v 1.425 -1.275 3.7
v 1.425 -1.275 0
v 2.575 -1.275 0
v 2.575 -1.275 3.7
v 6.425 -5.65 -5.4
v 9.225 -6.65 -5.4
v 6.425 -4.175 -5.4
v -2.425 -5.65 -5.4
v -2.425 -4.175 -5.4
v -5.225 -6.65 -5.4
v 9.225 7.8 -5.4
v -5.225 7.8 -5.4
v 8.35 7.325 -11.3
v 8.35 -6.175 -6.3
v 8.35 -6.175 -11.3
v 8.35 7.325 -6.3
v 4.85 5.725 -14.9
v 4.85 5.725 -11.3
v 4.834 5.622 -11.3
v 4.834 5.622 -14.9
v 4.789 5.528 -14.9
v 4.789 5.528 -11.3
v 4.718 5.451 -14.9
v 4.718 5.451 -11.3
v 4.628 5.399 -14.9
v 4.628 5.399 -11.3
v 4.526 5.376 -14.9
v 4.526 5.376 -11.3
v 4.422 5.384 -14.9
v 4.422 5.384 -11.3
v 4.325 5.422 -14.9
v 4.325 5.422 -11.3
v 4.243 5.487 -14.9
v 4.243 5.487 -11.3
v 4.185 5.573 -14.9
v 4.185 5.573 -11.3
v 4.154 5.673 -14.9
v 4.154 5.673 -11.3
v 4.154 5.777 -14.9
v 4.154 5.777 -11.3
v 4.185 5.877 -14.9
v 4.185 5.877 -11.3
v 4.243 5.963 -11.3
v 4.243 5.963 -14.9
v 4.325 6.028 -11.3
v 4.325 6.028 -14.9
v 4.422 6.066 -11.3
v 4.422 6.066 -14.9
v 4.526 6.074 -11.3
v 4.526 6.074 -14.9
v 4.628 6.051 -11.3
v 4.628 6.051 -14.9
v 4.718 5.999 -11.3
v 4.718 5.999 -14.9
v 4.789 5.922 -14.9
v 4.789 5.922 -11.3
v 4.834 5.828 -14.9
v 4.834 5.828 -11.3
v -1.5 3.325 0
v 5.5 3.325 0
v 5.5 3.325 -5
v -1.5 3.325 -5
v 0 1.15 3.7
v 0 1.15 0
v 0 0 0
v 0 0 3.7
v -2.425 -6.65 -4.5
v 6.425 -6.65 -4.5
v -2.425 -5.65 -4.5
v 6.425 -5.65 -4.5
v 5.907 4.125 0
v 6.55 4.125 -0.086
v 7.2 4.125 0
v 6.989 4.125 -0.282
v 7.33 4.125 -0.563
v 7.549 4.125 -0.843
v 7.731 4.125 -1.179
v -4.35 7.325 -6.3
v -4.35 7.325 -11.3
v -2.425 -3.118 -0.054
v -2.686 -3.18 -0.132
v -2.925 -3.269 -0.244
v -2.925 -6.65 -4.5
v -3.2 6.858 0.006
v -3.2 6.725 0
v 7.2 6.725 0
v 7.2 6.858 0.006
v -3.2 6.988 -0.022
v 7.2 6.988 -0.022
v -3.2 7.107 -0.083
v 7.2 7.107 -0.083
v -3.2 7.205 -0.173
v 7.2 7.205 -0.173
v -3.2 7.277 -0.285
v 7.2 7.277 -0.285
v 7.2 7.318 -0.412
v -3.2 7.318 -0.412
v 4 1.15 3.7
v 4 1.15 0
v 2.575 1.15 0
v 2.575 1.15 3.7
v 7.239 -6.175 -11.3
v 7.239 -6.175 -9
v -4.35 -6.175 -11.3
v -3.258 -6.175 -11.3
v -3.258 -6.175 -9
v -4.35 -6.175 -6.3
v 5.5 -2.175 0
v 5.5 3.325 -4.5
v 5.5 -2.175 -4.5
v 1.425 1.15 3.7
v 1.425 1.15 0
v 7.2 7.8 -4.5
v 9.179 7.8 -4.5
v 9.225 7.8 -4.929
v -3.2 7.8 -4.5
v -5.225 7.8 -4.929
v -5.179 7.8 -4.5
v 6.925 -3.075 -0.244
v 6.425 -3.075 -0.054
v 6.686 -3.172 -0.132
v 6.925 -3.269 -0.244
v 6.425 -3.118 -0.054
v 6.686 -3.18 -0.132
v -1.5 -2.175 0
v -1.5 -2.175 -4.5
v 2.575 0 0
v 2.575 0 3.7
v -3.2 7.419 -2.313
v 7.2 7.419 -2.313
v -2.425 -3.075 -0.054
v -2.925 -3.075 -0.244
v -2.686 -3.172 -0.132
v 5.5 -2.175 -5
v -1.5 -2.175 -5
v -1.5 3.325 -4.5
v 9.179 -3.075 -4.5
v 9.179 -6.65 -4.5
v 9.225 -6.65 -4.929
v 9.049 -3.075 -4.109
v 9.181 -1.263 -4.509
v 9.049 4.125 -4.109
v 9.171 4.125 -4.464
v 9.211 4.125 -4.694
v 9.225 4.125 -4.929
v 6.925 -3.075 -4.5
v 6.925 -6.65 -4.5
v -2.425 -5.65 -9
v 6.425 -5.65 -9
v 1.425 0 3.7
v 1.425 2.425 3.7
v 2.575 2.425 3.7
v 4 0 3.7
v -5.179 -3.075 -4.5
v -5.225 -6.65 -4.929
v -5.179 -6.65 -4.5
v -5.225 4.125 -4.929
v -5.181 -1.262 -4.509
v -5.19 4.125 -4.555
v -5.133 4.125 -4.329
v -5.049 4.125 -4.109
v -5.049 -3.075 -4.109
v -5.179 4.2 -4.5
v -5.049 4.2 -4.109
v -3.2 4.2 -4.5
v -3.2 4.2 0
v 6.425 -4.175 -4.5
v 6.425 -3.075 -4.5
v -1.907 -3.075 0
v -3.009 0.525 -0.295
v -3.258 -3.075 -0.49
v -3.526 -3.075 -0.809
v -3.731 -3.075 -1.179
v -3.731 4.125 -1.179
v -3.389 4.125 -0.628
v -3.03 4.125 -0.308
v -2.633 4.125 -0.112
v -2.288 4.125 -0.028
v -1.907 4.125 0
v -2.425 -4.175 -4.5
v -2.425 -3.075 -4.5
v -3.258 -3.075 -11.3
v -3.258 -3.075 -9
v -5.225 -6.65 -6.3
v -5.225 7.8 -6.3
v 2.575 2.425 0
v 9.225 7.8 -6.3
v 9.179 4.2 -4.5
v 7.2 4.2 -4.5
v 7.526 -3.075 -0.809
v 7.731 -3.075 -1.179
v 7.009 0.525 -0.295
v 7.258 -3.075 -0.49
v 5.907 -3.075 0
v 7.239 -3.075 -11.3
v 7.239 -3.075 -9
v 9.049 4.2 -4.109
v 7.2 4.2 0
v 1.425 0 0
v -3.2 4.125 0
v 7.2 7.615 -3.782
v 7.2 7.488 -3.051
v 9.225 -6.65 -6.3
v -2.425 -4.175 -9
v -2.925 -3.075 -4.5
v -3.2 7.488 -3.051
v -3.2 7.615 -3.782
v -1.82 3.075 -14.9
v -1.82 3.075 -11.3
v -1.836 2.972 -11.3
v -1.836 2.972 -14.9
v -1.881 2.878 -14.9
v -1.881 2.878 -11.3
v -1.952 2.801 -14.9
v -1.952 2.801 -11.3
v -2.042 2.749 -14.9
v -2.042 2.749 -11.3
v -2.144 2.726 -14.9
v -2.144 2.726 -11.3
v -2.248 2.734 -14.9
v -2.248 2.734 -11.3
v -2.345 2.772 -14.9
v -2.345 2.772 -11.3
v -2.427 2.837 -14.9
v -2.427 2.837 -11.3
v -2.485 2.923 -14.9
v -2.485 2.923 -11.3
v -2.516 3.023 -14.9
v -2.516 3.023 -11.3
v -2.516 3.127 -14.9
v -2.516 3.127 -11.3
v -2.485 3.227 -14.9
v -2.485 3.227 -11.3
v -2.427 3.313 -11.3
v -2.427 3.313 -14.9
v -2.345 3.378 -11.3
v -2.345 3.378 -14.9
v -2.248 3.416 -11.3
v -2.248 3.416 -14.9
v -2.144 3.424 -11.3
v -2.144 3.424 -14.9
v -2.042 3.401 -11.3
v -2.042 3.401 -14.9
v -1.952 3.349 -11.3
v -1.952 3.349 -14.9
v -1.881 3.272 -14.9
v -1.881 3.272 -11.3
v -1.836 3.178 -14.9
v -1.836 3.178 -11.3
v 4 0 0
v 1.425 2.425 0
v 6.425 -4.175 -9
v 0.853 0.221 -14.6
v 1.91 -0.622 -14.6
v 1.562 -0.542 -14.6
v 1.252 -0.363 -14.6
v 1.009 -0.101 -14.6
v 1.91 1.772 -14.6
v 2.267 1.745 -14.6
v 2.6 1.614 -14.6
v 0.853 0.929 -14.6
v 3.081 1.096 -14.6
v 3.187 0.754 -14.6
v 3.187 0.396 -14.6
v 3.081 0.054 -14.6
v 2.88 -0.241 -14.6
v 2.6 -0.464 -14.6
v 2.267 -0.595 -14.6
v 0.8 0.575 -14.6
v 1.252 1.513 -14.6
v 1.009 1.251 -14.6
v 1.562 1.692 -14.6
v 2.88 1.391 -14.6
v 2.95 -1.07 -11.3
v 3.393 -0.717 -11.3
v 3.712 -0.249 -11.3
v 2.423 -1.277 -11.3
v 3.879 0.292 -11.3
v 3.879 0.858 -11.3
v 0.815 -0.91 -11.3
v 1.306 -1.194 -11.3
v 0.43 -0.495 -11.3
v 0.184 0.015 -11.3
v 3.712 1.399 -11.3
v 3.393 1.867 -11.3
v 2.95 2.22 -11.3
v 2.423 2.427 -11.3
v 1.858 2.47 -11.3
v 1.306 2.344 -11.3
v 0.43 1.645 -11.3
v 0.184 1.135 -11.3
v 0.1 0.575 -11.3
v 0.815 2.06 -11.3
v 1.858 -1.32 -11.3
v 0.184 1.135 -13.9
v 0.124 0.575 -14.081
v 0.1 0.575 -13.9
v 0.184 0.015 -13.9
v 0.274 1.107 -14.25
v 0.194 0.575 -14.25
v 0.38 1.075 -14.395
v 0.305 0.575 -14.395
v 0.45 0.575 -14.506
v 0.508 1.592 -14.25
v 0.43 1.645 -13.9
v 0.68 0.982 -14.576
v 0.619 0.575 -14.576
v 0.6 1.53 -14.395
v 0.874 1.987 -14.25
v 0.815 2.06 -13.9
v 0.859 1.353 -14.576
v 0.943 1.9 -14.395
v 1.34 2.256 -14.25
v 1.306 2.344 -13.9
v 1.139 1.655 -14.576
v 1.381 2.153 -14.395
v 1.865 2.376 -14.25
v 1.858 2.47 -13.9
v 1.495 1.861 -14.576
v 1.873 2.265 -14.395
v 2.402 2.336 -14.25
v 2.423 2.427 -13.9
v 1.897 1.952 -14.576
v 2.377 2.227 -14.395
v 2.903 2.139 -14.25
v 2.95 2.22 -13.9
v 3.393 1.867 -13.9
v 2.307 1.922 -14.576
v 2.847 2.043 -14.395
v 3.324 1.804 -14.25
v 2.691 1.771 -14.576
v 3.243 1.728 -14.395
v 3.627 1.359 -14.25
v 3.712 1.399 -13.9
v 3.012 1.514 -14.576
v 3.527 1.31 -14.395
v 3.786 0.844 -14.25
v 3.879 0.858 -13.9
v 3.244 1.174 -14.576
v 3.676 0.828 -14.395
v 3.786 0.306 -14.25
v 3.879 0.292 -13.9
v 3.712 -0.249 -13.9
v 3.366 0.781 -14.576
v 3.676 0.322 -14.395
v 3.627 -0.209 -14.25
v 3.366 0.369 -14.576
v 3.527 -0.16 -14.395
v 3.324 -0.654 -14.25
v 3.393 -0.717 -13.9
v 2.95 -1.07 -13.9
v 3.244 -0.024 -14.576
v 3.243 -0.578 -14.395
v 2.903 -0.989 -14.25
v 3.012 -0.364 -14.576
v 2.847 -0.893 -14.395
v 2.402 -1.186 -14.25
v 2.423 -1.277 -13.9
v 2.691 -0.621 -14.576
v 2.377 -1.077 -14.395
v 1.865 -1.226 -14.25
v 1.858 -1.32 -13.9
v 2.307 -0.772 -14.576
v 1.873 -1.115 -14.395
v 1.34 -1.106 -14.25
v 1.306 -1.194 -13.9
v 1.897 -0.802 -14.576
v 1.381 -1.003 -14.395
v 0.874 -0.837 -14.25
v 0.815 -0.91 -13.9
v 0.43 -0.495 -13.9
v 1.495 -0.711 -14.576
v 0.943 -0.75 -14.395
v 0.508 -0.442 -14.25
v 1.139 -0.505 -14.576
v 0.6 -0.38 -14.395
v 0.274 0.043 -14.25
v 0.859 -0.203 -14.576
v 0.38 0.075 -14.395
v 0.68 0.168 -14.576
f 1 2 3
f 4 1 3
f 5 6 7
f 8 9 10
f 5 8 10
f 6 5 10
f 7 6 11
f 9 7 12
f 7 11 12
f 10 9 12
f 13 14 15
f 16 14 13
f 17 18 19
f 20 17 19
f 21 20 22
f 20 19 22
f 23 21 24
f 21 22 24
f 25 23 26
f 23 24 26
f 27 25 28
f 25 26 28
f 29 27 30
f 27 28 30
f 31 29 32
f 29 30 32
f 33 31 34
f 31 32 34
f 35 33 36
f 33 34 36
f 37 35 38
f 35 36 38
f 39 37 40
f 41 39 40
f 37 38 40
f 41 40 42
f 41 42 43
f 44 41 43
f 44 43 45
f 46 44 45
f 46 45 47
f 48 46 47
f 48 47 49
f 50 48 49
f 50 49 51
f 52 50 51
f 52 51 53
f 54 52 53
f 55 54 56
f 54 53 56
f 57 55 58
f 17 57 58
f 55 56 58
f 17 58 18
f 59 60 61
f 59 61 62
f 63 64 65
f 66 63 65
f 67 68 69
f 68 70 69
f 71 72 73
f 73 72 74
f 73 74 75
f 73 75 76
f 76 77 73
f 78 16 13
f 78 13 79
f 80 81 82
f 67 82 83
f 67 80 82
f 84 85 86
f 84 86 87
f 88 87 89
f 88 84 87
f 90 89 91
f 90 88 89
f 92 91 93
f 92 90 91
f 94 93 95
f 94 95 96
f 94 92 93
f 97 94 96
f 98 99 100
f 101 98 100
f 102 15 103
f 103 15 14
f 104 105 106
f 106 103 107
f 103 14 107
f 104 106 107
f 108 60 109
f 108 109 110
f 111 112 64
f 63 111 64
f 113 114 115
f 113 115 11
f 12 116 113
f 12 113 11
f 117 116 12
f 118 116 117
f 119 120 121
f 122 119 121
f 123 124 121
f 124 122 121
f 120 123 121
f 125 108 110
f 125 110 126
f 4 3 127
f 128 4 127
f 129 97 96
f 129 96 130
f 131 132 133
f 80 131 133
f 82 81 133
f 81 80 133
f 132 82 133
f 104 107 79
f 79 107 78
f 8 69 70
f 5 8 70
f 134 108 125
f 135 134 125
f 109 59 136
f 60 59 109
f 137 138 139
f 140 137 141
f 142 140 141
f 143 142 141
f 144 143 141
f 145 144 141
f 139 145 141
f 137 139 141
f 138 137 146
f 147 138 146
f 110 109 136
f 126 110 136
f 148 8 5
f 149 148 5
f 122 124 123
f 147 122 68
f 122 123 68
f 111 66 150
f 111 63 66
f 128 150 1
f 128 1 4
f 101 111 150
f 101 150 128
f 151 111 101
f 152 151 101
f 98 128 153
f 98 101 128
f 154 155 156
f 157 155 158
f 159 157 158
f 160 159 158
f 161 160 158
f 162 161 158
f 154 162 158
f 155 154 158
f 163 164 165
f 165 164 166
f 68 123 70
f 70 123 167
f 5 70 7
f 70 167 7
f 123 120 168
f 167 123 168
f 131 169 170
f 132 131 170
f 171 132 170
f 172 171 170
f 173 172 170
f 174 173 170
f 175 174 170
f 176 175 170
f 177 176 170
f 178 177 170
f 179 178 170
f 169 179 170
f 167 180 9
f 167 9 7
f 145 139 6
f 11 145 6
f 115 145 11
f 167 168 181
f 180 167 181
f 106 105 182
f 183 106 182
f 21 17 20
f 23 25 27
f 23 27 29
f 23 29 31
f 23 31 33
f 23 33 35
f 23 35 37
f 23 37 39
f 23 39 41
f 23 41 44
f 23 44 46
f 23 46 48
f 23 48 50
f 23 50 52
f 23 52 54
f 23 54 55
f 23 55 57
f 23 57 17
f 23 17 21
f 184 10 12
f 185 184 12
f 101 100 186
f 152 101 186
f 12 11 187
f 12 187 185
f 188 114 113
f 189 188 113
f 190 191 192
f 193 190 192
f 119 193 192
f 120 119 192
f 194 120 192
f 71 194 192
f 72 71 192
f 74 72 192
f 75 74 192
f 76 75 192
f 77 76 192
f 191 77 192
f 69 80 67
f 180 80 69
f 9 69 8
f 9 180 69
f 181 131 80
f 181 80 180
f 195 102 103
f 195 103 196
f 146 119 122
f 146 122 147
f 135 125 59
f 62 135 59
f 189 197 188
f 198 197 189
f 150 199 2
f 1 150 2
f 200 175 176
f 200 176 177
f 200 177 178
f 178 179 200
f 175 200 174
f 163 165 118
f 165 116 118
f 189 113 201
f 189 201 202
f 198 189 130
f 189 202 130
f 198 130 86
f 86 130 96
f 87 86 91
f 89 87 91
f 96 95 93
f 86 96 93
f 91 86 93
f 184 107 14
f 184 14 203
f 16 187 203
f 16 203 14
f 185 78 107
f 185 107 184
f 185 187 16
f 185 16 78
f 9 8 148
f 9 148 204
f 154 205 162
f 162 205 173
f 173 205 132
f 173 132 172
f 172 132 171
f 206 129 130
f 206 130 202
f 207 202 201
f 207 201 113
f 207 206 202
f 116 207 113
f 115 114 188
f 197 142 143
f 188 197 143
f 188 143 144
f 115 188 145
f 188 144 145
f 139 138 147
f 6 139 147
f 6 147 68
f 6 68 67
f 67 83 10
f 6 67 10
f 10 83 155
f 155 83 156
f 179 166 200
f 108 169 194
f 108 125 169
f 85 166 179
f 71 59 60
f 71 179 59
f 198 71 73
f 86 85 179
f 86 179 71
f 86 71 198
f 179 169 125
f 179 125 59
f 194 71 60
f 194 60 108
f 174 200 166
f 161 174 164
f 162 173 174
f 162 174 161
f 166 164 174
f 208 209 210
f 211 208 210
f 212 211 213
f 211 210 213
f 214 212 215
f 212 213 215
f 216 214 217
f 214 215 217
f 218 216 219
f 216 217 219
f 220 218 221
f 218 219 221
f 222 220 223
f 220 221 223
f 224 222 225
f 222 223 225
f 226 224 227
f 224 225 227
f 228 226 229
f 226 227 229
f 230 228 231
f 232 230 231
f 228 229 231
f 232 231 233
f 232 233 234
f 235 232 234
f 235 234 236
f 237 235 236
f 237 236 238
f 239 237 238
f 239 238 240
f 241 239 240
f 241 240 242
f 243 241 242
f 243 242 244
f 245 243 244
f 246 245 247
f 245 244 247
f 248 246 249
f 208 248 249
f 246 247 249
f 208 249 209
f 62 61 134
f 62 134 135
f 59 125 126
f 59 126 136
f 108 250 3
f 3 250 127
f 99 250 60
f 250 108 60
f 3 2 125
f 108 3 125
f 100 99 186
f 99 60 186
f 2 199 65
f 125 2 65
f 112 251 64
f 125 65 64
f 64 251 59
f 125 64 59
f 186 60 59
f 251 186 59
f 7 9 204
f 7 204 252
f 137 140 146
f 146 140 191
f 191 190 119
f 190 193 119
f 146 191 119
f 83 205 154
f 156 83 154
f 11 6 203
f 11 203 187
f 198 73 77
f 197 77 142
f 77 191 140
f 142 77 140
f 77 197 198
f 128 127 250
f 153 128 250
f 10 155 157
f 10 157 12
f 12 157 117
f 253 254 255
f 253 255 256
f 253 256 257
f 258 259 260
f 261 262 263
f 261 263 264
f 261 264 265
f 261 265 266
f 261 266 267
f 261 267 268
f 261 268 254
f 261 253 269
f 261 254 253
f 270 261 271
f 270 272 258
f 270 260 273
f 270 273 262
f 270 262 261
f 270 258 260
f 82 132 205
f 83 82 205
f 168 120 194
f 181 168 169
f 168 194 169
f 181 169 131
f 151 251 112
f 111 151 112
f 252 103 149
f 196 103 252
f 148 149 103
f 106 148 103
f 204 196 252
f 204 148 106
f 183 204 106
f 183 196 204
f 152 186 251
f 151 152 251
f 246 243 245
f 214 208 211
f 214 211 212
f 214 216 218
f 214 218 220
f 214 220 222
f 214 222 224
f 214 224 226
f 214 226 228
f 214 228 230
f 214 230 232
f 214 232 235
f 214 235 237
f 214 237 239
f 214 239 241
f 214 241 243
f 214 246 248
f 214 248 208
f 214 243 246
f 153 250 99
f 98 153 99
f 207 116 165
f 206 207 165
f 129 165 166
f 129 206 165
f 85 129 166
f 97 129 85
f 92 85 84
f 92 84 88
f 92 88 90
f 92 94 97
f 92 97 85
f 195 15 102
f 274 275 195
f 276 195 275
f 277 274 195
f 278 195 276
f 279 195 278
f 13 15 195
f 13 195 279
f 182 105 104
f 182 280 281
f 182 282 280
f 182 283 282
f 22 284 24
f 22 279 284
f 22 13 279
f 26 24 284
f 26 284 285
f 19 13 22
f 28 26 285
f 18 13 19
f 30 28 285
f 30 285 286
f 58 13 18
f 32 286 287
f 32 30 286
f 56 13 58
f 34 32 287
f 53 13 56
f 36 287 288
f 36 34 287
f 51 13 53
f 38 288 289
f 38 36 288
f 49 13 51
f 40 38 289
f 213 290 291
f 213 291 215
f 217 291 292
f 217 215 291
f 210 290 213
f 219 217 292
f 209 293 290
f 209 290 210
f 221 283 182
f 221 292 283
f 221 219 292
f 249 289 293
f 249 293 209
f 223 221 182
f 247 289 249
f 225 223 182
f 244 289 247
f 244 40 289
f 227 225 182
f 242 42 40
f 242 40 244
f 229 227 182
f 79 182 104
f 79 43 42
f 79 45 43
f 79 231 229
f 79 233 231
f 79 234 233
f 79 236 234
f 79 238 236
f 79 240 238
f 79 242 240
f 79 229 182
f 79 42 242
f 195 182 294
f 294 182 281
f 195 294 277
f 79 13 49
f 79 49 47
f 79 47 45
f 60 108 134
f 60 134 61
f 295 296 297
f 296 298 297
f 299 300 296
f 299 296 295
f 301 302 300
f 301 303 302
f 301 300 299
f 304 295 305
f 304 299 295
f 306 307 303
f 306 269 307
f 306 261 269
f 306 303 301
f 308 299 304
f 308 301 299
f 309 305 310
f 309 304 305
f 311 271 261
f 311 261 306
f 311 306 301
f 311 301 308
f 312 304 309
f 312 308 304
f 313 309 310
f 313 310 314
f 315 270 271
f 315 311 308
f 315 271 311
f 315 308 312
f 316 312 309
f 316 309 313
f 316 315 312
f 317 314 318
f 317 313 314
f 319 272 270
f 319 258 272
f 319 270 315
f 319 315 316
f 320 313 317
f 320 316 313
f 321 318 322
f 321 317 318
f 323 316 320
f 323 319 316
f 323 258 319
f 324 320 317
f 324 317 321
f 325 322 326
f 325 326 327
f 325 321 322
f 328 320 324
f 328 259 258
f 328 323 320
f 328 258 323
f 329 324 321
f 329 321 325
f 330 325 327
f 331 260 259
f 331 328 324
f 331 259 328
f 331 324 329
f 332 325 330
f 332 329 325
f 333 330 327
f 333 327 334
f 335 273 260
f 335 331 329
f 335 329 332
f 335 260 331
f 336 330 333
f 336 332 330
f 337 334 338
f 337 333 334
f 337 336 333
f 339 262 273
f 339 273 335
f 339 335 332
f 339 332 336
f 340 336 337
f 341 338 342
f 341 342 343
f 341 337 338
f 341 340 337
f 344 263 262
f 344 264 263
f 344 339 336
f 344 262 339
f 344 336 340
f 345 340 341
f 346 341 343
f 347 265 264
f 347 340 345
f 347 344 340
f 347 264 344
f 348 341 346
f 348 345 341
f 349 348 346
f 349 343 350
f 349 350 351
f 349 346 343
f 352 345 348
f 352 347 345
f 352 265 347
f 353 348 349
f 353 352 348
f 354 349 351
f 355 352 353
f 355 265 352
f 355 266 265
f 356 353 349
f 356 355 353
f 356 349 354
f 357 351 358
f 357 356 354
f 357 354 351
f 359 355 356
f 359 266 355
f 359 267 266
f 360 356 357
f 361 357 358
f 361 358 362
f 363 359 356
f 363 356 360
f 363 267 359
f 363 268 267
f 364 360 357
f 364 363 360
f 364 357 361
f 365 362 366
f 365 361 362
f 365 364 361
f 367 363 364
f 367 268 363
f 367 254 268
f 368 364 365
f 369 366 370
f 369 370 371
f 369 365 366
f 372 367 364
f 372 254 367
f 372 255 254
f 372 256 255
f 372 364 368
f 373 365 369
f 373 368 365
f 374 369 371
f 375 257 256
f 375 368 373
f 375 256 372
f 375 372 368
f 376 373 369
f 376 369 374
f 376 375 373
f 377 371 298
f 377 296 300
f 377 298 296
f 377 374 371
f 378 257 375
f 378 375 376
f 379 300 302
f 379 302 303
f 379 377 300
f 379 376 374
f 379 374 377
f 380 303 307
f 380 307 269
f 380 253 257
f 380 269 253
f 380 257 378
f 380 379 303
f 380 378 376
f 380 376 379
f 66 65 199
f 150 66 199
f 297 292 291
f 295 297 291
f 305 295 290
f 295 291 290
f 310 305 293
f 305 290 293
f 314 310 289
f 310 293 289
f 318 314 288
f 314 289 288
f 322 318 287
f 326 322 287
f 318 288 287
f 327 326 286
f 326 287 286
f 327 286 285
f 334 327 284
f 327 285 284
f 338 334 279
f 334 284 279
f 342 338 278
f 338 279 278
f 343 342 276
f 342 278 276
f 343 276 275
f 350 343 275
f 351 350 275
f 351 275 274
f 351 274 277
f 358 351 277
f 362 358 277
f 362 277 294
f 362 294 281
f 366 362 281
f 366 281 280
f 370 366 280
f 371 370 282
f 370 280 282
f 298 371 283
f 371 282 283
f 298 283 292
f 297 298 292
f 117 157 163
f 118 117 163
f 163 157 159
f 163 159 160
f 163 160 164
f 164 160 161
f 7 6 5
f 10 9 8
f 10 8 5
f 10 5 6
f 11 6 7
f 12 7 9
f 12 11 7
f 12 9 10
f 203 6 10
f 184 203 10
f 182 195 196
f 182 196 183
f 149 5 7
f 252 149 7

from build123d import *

# Parameters (mm, degrees)
BOSS_EXTRUDE1_DEPTH  = 3.7
SKETCH2_W            = 7
SKETCH2_H            = 5.5
BOSS_EXTRUDE2_DEPTH  = 5
SKETCH3_W            = 7
SKETCH3_H            = 3.4
BOSS_EXTRUDE3_DEPTH  = 4.5
SKETCH4_W            = 14.45
SKETCH4_H            = 14.45
BOSS_EXTRUDE4_DEPTH  = 0.9
BOSS_EXTRUDE5_DEPTH  = 10.4
BOSS_EXTRUDE6_DEPTH  = 7.275
FILLET3_START        = -8
FILLET3_DEPTH        = 12.125
FILLET3_START_2      = 4.125
FILLET3_2_DEPTH      = 4.875
SKETCH8_W            = 8.85
SKETCH8_H            = 1.475
CUT_EXTRUDE1_DEPTH   = 15.600706435
BOSS_EXTRUDE7_DEPTH  = 0.5
CUT_EXTRUDE2_DEPTH   = 16.248811596
BOSS_EXTRUDE8_DEPTH  = 0.5
CUT_EXTRUDE3_DEPTH   = 0.5
SKETCH13_W           = 14.45
SKETCH13_H           = 14.45
BOSS_EXTRUDE9_DEPTH  = 0.9
SKETCH14_W           = 12.7
SKETCH14_H           = 13.5
BOSS_EXTRUDE10_DEPTH = 5
SKETCH15_R           = 1.9
BOSS_EXTRUDE11_DEPTH = 3.3
FILLET4_R            = 0.7
SKETCH16_W           = 8.85
SKETCH16_H           = 1.475
CUT_EXTRUDE4_DEPTH   = 16.184881574
SKETCH17_W           = 10.496766354
SKETCH17_H           = 3.1
CUT_EXTRUDE5_DEPTH   = 2.3
SKETCH18_R           = 0.35
BOSS_EXTRUDE12_DEPTH = 3.6


with BuildPart() as part:
    # Sketch1 → Boss-Extrude1 (new body)
    with BuildSketch(Plane.XY):
        Polygon((0, 0), (1.425, 0), (1.425, -1.275), (2.575, -1.275), (2.575, 0), (4, 0), (4, 1.15), (2.575, 1.15), (2.575, 2.425), (1.425, 2.425), (1.425, 1.15), (0, 1.15), align=None)
    extrude(amount=BOSS_EXTRUDE1_DEPTH)

    # Sketch2 → Boss-Extrude2 (add)
    with BuildSketch(Plane(origin=(0, 0, 0), x_dir=(-1, 0, 0), z_dir=(0, 0, -1))):
        with Locations((-2, 0.575)):
            Rectangle(SKETCH2_W, SKETCH2_H)
    extrude(amount=BOSS_EXTRUDE2_DEPTH)


with BuildPart() as body_2:
    # Sketch3 → Boss-Extrude3 (new body)
    with BuildSketch(Plane.XY):
        Polygon((-3.2, 6.725), (-3.2, -2.175), (-1.5, -2.175), (-1.5, 3.325), (-1.5, 6.725), align=None)
        Polygon((-3.2, -2.175), (-3.2, -3.075), (7.2, -3.075), (7.2, -2.175), (5.5, -2.175), (-1.5, -2.175), align=None)
        Polygon((5.5, -2.175), (7.2, -2.175), (7.2, 6.725), (5.5, 6.725), (5.5, 3.325), align=None)
        with Locations((2, 5.025)):
            Rectangle(SKETCH3_W, SKETCH3_H)
    extrude(amount=-BOSS_EXTRUDE3_DEPTH)



with BuildPart() as body_3:
    # Sketch4 → Boss-Extrude4 (new body)
    with BuildSketch(Plane(origin=(0, 0, -4.5), x_dir=(-1, 0, 0), z_dir=(0, 0, -1))):
        with Locations((-2, 0.575)):
            Rectangle(SKETCH4_W, SKETCH4_H)
    extrude(amount=BOSS_EXTRUDE4_DEPTH)


with BuildPart() as body_2_1:
    add(body_2.part)

    add(body_3.part)  # Boss-Extrude5 merges body 3
    # Sketch6 → Boss-Extrude5 (add)
    with BuildSketch(Plane.ZY.offset(3.2)):
        with BuildLine():
            Line((-0.411871522, 7.317602539), (-2.312635971, 7.419289526))
            ThreePointArc((-2.312635971, 7.419289526), (-3.417645725, 7.544561473), (-4.5, 7.8))
            Line((-4.5, 7.8), (-4.5, 6.725))
            Line((-4.5, 6.725), (0, 6.725))
            ThreePointArc((0, 6.725), (-0.083203757, 7.106602655), (-0.411871522, 7.317602539))
        make_face()
    extrude(amount=-BOSS_EXTRUDE5_DEPTH)

    # Sketch7 → Boss-Extrude6 (add)
    with BuildSketch(Plane.XZ.offset(3.075)):
        Polygon((7.2, 0), (9.225, -4.5), (7.2, -4.5), align=None)
        Polygon((-3.2, 0), (-5.225, -4.5), (-3.2, -4.5), align=None)
    extrude(amount=-BOSS_EXTRUDE6_DEPTH)

    # Fillet3: read off the stored shape, not the designer's step
    # Fillet3 outline → Fillet3 (cut)
    with BuildSketch(Plane(origin=(0, 0, 0), x_dir=(1, 0, 0), z_dir=(0, 1, 0)).offset(FILLET3_START)):
        with BuildLine():
            Line((-5.225, 4.5), (-5.04884301, 4.108540023))
            add(Edge.make_bspline(
                [(-5.225, 4.929269378), (-5.225, 4.5), (-5.04884301, 4.108540023)],
                knots=[0, 0, 0, 1, 1, 1], degree=2))
            Line((-5.225, 4.929269378), (-5.225, 4.5))
        make_face()
        with BuildLine():
            Line((-3.2, 0), (-1.90682878, 0))
            add(Edge.make_bspline(
                [(-3.73067179, 1.179270645), (-3.2, 0), (-1.90682878, 0)],
                knots=[0, 0, 0, 1, 1, 1], degree=2))
            Line((-3.73067179, 1.179270645), (-3.2, 0))
        make_face()
        with BuildLine():
            Line((7.2, 0), (7.73067179, 1.179270645))
            add(Edge.make_bspline(
                [(5.90682878, 0), (7.2, 0), (7.73067179, 1.179270645)],
                knots=[0, 0, 0, 1, 1, 1], degree=2))
            Line((5.90682878, 0), (7.2, 0))
        make_face()
        with BuildLine():
            add(Edge.make_bspline(
                [(9.04884301, 4.108540023), (9.225, 4.5), (9.225, 4.929269378)],
                knots=[0, 0, 0, 1, 1, 1], degree=2))
            Line((9.04884301, 4.108540023), (9.225, 4.5))
            Line((9.225, 4.5), (9.225, 4.929269378))
        make_face()
    extrude(amount=FILLET3_DEPTH, mode=Mode.SUBTRACT)

    # Fillet3 2 outline → Fillet3 2 (cut)
    with BuildSketch(Plane(origin=(0, 0, 0), x_dir=(1, 0, 0), z_dir=(0, 1, 0)).offset(FILLET3_START_2)):
        with BuildLine():
            Line((-5.225, 4.5), (-5.04884301, 4.108540023))
            add(Edge.make_bspline(
                [(-5.225, 4.929269378), (-5.225, 4.5), (-5.04884301, 4.108540023)],
                knots=[0, 0, 0, 1, 1, 1], degree=2))
            Line((-5.225, 4.929269378), (-5.225, 4.5))
        make_face()
        with BuildLine():
            add(Edge.make_bspline(
                [(9.04884301, 4.108540023), (9.225, 4.5), (9.225, 4.929269378)],
                knots=[0, 0, 0, 1, 1, 1], degree=2))
            Line((9.04884301, 4.108540023), (9.225, 4.5))
            Line((9.225, 4.5), (9.225, 4.929269378))
        make_face()
    extrude(amount=FILLET3_2_DEPTH, mode=Mode.SUBTRACT)

    # Sketch8 → Cut-Extrude1 (cut, through all)
    with BuildSketch(Plane.XY.offset(-4.5)):
        with Locations((2, -4.9125)):
            Rectangle(SKETCH8_W, SKETCH8_H)
    extrude(amount=-CUT_EXTRUDE1_DEPTH, mode=Mode.SUBTRACT)

    # Sketch9 → Boss-Extrude7 (add)
    with BuildSketch(Plane.ZY.offset(-6.425)):
        Polygon((0, -3.075), (-4.5, -6.65), (-4.5, -3.075), align=None)
    extrude(amount=-BOSS_EXTRUDE7_DEPTH)

    # Sketch10 → Cut-Extrude2 (cut, through all)
    with BuildSketch(Plane(origin=(0, -3.075, 0), x_dir=(1, 0, 0), z_dir=(0, 1, 0))):
        with BuildLine():
            Line((6.925, 0), (6.925, 0.243708852))
            add(Edge.make_bspline(
                [(6.925, 0.243708852), (6.697101215, 0.114632789), (6.425, 0.053919569)],
                knots=[0, 0, 0, 1, 1, 1], degree=2))
            Line((6.425, 0.053919569), (6.425, 0))
            Line((6.425, 0), (6.925, 0))
        make_face()
    extrude(amount=-CUT_EXTRUDE2_DEPTH, mode=Mode.SUBTRACT)

    # Sketch11 → Boss-Extrude8 (add)
    with BuildSketch(Plane(origin=(-2.425, 0, 0), x_dir=(0, 0, -1), z_dir=(1, 0, 0))):
        Polygon((0.053919569, -3.117836102), (4.5, -6.65), (4.5, -5.65), (5.4, -5.65), (5.4, -4.175), (4.5, -4.175), (4.5, -3.075), (0.053919569, -3.075), align=None)
    extrude(amount=-BOSS_EXTRUDE8_DEPTH)

    # Sketch12 → Cut-Extrude3 (cut)
    with BuildSketch(Plane(origin=(0, -3.075, 0), x_dir=(1, 0, 0), z_dir=(0, 1, 0))):
        with BuildLine():
            Line((-2.925, 0.053919569), (-2.425, 0.053919569))
            add(Edge.make_bspline(
                [(-2.425, 0.053919569), (-2.697101223, 0.114632791), (-2.925000013, 0.24370886)],
                knots=[0, 0, 0, 1, 1, 1], degree=2))
            Line((-2.925000013, 0.24370886), (-2.925, 0.053919569))
        make_face()
    extrude(amount=-CUT_EXTRUDE3_DEPTH, mode=Mode.SUBTRACT)


with BuildPart() as body_3_2:
    # Sketch13 → Boss-Extrude9 (new body)
    with BuildSketch(Plane(origin=(0, 0, -5.4), x_dir=(-1, 0, 0), z_dir=(0, 0, -1))):
        with Locations((-2, 0.575)):
            Rectangle(SKETCH13_W, SKETCH13_H)
    extrude(amount=BOSS_EXTRUDE9_DEPTH)

    # Sketch14 → Boss-Extrude10 (add)
    with BuildSketch(Plane(origin=(0, 0, -6.3), x_dir=(-1, 0, 0), z_dir=(0, 0, -1))):
        with Locations((-2, 0.575)):
            Rectangle(SKETCH14_W, SKETCH14_H)
    extrude(amount=BOSS_EXTRUDE10_DEPTH)

    # Sketch15 → Boss-Extrude11 (add)
    with BuildSketch(Plane(origin=(0, 0, -11.3), x_dir=(-1, 0, 0), z_dir=(0, 0, -1))):
        with Locations((-2, 0.575)):
            Circle(SKETCH15_R)
    extrude(amount=BOSS_EXTRUDE11_DEPTH)

    # Fillet4
    fillet4_edges = [body_3_2.edges().sort_by_distance(p)[0] for p in [
        (3.9, 0.575, -14.6),
    ]]
    fillet(fillet4_edges, radius=FILLET4_R)

    # Sketch16 → Cut-Extrude4 (cut, through all)
    with BuildSketch(Plane.XY.offset(-5.4)):
        with Locations((2, -4.9125)):
            Rectangle(SKETCH16_W, SKETCH16_H)
    extrude(amount=-CUT_EXTRUDE4_DEPTH, mode=Mode.SUBTRACT)

    # Sketch17 → Cut-Extrude5 (cut)
    with BuildSketch(Plane(origin=(0, 0, -11.3), x_dir=(-1, 0, 0), z_dir=(0, 0, -1))):
        with Locations((-1.99026274, -4.625)):
            Rectangle(SKETCH17_W, SKETCH17_H)
    extrude(amount=-CUT_EXTRUDE5_DEPTH, mode=Mode.SUBTRACT)

    # Sketch18 → Boss-Extrude12 (add)
    with BuildSketch(Plane(origin=(0, 0, -11.3), x_dir=(-1, 0, 0), z_dir=(0, 0, -1))):
        with Locations(Location((-4.5, 5.725, 0), (0, 0, 180))):
            Circle(SKETCH18_R)
        with Locations(Location((2.17, 3.075, 0), (0, 0, 180))):
            Circle(SKETCH18_R)
    extrude(amount=BOSS_EXTRUDE12_DEPTH)


solid = Compound([part.part, body_2_1.part, body_3_2.part])
